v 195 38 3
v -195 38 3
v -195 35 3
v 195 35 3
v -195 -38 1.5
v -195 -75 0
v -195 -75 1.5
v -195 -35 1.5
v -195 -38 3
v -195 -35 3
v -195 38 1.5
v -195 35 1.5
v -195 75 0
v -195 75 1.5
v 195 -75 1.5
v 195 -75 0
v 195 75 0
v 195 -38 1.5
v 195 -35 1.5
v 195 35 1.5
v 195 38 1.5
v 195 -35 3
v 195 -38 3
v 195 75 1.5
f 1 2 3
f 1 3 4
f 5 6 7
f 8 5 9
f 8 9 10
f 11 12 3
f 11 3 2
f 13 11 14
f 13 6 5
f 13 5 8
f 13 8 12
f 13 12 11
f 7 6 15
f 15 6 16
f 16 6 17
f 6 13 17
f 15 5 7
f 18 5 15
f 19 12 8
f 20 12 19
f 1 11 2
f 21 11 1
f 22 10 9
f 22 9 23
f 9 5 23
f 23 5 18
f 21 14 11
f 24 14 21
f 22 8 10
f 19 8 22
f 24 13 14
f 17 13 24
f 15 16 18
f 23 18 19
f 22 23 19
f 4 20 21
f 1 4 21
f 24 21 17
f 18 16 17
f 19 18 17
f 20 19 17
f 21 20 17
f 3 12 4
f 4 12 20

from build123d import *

# Parameters (mm, degrees)
F0_W     = 390
F0_H     = 37
F1_DEPTH = 1.5
F0_H_2   = 70
F0_H_3   = 3
F2_DEPTH = 3


with BuildPart() as f1:
    # F0 (on Top) → F1 (new body)
    with BuildSketch(Plane.XY):
        with Locations((0, 56.5)):
            Rectangle(F0_W, F0_H)
    extrude(amount=F1_DEPTH)



with BuildPart() as f1b:
    # F0 (on Top) → F1, piece 2 (new body)
    with BuildSketch(Plane.XY):
        Rectangle(F0_W, F0_H_2)
    extrude(amount=F1_DEPTH)


with BuildPart() as f1c:
    # F0 (on Top) → F1, piece 3 (new body)
    with BuildSketch(Plane.XY):
        with Locations((0, -56.5)):
            Rectangle(F0_W, F0_H)
    extrude(amount=F1_DEPTH)


with BuildPart() as f1_1:
    add(f1.part)

    add(f1b.part)  # F2 merges F1b

    add(f1c.part)  # F2 merges F1c
    # F0 (on Top) → F2 (join)
    with BuildSketch(Plane.XY):
        with Locations((0, 36.5)):
            Rectangle(F0_W, F0_H_3)
        with Locations((0, -36.5)):
            Rectangle(F0_W, F0_H_3)
    extrude(amount=F2_DEPTH)


solid = f1_1.part
